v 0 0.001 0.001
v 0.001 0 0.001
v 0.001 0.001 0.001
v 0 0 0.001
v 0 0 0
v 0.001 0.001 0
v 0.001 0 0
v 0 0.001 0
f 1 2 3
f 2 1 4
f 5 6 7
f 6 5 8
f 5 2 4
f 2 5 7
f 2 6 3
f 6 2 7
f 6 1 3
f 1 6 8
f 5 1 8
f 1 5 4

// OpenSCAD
// t_profile — the cross-section and the lumen. Pure data.

use <../src/uniTube.scad>;

// --- od / id / wall are three spellings of one profile -----------------------
a = ut_round(od = 12, id = 8);
b = ut_round(od = 12, wall = 2);
c = ut_round(id = 8, wall = 2);
assert(abs(ut_prof_od(a) - 12) < 1e-9 && abs(ut_prof_id(a) - 8) < 1e-9, "ut_round(od,id)");
assert(abs(ut_prof_wall(a) - 2) < 1e-9, "ut_round(od,id): wall is derived");
assert(abs(ut_prof_id(b) - 8) < 1e-9, "ut_round(od,wall): id is derived");
assert(abs(ut_prof_od(c) - 12) < 1e-9, "ut_round(id,wall): od is derived");
assert(len(ut_prof_outer(a)) == len(ut_prof_outer(b)), "all three spellings agree on facet count");

// --- PROF-1: winding ---------------------------------------------------------
assert(ut_area2d(ut_prof_outer(a)) > 0, "PROF-1: outer is CCW");
assert(ut_area2d(ut_prof_inner(a)) > 0, "PROF-1: inner is ALSO CCW -- the emitter orients it, not the profile");

// --- PROF-2: correspondence (ADR 0006) ---------------------------------------
o = ut_prof_outer(a);
i = ut_prof_inner(a);
assert(len(o) == len(i), "PROF-2: equal point count");
assert(max([for (k = [0:len(o) - 1]) abs(atan2(o[k][1], o[k][0]) - atan2(i[k][1], i[k][0]))]) < 1e-6,
       "PROF-2: outer[k] and inner[k] sit at the same polar angle");

// --- the three regions -------------------------------------------------------
assert(len(ut_solid_rgn(a)) == 2, "solid region = outer + bore");
assert(len(ut_shell_rgn(a)) == 1, "shell region = outer only");
assert(len(ut_bore_rgn(a)) == 1, "bore region = the lumen as a POSITIVE solid");
rod = ut_rod(d = 10);
assert(!ut_prof_hollow(rod), "a rod has no lumen");
assert(len(ut_bore_rgn(rod)) == 0, "a rod's bore region is empty -- callers must guard on this");

// --- PROF-3: thin wall is a WARNING, not an error ----------------------------
assert(ut_prof_thin(ut_round(od = 10, id = 8)), "PROF-3: a 1 mm wall is below the minimum");
assert(!ut_prof_thin(ut_round(od = 12, wall = 2)), "PROF-3: a 2 mm wall is fine");

// --- an arbitrary hollow section: square bore in a round shell ---------------
// Sampled BY ANGLE, which is what makes it correspondence-aligned. Sampling the
// square by perimeter instead satisfies the count rule, self-intersects the end
// caps, and CGAL reports only "assertion violation" (ADR 0006).
function sq_by_angle(h, n) = [for (k = [0:n - 1])
        let(t = 360 * k / n, cx = cos(t), cy = sin(t), m = h / max(abs(cx), abs(cy)))[m * cx, m *cy]];
N = len(ut_prof_outer(a));
sqp = ut_profile(ut_ring(6, N), sq_by_angle(3, N), [[ "kind", "square-bore" ]]);
assert(len(ut_solid_rgn(sqp)) == 2, "arbitrary hollow section is a first-class profile");

cube(0.001); // sentinel
